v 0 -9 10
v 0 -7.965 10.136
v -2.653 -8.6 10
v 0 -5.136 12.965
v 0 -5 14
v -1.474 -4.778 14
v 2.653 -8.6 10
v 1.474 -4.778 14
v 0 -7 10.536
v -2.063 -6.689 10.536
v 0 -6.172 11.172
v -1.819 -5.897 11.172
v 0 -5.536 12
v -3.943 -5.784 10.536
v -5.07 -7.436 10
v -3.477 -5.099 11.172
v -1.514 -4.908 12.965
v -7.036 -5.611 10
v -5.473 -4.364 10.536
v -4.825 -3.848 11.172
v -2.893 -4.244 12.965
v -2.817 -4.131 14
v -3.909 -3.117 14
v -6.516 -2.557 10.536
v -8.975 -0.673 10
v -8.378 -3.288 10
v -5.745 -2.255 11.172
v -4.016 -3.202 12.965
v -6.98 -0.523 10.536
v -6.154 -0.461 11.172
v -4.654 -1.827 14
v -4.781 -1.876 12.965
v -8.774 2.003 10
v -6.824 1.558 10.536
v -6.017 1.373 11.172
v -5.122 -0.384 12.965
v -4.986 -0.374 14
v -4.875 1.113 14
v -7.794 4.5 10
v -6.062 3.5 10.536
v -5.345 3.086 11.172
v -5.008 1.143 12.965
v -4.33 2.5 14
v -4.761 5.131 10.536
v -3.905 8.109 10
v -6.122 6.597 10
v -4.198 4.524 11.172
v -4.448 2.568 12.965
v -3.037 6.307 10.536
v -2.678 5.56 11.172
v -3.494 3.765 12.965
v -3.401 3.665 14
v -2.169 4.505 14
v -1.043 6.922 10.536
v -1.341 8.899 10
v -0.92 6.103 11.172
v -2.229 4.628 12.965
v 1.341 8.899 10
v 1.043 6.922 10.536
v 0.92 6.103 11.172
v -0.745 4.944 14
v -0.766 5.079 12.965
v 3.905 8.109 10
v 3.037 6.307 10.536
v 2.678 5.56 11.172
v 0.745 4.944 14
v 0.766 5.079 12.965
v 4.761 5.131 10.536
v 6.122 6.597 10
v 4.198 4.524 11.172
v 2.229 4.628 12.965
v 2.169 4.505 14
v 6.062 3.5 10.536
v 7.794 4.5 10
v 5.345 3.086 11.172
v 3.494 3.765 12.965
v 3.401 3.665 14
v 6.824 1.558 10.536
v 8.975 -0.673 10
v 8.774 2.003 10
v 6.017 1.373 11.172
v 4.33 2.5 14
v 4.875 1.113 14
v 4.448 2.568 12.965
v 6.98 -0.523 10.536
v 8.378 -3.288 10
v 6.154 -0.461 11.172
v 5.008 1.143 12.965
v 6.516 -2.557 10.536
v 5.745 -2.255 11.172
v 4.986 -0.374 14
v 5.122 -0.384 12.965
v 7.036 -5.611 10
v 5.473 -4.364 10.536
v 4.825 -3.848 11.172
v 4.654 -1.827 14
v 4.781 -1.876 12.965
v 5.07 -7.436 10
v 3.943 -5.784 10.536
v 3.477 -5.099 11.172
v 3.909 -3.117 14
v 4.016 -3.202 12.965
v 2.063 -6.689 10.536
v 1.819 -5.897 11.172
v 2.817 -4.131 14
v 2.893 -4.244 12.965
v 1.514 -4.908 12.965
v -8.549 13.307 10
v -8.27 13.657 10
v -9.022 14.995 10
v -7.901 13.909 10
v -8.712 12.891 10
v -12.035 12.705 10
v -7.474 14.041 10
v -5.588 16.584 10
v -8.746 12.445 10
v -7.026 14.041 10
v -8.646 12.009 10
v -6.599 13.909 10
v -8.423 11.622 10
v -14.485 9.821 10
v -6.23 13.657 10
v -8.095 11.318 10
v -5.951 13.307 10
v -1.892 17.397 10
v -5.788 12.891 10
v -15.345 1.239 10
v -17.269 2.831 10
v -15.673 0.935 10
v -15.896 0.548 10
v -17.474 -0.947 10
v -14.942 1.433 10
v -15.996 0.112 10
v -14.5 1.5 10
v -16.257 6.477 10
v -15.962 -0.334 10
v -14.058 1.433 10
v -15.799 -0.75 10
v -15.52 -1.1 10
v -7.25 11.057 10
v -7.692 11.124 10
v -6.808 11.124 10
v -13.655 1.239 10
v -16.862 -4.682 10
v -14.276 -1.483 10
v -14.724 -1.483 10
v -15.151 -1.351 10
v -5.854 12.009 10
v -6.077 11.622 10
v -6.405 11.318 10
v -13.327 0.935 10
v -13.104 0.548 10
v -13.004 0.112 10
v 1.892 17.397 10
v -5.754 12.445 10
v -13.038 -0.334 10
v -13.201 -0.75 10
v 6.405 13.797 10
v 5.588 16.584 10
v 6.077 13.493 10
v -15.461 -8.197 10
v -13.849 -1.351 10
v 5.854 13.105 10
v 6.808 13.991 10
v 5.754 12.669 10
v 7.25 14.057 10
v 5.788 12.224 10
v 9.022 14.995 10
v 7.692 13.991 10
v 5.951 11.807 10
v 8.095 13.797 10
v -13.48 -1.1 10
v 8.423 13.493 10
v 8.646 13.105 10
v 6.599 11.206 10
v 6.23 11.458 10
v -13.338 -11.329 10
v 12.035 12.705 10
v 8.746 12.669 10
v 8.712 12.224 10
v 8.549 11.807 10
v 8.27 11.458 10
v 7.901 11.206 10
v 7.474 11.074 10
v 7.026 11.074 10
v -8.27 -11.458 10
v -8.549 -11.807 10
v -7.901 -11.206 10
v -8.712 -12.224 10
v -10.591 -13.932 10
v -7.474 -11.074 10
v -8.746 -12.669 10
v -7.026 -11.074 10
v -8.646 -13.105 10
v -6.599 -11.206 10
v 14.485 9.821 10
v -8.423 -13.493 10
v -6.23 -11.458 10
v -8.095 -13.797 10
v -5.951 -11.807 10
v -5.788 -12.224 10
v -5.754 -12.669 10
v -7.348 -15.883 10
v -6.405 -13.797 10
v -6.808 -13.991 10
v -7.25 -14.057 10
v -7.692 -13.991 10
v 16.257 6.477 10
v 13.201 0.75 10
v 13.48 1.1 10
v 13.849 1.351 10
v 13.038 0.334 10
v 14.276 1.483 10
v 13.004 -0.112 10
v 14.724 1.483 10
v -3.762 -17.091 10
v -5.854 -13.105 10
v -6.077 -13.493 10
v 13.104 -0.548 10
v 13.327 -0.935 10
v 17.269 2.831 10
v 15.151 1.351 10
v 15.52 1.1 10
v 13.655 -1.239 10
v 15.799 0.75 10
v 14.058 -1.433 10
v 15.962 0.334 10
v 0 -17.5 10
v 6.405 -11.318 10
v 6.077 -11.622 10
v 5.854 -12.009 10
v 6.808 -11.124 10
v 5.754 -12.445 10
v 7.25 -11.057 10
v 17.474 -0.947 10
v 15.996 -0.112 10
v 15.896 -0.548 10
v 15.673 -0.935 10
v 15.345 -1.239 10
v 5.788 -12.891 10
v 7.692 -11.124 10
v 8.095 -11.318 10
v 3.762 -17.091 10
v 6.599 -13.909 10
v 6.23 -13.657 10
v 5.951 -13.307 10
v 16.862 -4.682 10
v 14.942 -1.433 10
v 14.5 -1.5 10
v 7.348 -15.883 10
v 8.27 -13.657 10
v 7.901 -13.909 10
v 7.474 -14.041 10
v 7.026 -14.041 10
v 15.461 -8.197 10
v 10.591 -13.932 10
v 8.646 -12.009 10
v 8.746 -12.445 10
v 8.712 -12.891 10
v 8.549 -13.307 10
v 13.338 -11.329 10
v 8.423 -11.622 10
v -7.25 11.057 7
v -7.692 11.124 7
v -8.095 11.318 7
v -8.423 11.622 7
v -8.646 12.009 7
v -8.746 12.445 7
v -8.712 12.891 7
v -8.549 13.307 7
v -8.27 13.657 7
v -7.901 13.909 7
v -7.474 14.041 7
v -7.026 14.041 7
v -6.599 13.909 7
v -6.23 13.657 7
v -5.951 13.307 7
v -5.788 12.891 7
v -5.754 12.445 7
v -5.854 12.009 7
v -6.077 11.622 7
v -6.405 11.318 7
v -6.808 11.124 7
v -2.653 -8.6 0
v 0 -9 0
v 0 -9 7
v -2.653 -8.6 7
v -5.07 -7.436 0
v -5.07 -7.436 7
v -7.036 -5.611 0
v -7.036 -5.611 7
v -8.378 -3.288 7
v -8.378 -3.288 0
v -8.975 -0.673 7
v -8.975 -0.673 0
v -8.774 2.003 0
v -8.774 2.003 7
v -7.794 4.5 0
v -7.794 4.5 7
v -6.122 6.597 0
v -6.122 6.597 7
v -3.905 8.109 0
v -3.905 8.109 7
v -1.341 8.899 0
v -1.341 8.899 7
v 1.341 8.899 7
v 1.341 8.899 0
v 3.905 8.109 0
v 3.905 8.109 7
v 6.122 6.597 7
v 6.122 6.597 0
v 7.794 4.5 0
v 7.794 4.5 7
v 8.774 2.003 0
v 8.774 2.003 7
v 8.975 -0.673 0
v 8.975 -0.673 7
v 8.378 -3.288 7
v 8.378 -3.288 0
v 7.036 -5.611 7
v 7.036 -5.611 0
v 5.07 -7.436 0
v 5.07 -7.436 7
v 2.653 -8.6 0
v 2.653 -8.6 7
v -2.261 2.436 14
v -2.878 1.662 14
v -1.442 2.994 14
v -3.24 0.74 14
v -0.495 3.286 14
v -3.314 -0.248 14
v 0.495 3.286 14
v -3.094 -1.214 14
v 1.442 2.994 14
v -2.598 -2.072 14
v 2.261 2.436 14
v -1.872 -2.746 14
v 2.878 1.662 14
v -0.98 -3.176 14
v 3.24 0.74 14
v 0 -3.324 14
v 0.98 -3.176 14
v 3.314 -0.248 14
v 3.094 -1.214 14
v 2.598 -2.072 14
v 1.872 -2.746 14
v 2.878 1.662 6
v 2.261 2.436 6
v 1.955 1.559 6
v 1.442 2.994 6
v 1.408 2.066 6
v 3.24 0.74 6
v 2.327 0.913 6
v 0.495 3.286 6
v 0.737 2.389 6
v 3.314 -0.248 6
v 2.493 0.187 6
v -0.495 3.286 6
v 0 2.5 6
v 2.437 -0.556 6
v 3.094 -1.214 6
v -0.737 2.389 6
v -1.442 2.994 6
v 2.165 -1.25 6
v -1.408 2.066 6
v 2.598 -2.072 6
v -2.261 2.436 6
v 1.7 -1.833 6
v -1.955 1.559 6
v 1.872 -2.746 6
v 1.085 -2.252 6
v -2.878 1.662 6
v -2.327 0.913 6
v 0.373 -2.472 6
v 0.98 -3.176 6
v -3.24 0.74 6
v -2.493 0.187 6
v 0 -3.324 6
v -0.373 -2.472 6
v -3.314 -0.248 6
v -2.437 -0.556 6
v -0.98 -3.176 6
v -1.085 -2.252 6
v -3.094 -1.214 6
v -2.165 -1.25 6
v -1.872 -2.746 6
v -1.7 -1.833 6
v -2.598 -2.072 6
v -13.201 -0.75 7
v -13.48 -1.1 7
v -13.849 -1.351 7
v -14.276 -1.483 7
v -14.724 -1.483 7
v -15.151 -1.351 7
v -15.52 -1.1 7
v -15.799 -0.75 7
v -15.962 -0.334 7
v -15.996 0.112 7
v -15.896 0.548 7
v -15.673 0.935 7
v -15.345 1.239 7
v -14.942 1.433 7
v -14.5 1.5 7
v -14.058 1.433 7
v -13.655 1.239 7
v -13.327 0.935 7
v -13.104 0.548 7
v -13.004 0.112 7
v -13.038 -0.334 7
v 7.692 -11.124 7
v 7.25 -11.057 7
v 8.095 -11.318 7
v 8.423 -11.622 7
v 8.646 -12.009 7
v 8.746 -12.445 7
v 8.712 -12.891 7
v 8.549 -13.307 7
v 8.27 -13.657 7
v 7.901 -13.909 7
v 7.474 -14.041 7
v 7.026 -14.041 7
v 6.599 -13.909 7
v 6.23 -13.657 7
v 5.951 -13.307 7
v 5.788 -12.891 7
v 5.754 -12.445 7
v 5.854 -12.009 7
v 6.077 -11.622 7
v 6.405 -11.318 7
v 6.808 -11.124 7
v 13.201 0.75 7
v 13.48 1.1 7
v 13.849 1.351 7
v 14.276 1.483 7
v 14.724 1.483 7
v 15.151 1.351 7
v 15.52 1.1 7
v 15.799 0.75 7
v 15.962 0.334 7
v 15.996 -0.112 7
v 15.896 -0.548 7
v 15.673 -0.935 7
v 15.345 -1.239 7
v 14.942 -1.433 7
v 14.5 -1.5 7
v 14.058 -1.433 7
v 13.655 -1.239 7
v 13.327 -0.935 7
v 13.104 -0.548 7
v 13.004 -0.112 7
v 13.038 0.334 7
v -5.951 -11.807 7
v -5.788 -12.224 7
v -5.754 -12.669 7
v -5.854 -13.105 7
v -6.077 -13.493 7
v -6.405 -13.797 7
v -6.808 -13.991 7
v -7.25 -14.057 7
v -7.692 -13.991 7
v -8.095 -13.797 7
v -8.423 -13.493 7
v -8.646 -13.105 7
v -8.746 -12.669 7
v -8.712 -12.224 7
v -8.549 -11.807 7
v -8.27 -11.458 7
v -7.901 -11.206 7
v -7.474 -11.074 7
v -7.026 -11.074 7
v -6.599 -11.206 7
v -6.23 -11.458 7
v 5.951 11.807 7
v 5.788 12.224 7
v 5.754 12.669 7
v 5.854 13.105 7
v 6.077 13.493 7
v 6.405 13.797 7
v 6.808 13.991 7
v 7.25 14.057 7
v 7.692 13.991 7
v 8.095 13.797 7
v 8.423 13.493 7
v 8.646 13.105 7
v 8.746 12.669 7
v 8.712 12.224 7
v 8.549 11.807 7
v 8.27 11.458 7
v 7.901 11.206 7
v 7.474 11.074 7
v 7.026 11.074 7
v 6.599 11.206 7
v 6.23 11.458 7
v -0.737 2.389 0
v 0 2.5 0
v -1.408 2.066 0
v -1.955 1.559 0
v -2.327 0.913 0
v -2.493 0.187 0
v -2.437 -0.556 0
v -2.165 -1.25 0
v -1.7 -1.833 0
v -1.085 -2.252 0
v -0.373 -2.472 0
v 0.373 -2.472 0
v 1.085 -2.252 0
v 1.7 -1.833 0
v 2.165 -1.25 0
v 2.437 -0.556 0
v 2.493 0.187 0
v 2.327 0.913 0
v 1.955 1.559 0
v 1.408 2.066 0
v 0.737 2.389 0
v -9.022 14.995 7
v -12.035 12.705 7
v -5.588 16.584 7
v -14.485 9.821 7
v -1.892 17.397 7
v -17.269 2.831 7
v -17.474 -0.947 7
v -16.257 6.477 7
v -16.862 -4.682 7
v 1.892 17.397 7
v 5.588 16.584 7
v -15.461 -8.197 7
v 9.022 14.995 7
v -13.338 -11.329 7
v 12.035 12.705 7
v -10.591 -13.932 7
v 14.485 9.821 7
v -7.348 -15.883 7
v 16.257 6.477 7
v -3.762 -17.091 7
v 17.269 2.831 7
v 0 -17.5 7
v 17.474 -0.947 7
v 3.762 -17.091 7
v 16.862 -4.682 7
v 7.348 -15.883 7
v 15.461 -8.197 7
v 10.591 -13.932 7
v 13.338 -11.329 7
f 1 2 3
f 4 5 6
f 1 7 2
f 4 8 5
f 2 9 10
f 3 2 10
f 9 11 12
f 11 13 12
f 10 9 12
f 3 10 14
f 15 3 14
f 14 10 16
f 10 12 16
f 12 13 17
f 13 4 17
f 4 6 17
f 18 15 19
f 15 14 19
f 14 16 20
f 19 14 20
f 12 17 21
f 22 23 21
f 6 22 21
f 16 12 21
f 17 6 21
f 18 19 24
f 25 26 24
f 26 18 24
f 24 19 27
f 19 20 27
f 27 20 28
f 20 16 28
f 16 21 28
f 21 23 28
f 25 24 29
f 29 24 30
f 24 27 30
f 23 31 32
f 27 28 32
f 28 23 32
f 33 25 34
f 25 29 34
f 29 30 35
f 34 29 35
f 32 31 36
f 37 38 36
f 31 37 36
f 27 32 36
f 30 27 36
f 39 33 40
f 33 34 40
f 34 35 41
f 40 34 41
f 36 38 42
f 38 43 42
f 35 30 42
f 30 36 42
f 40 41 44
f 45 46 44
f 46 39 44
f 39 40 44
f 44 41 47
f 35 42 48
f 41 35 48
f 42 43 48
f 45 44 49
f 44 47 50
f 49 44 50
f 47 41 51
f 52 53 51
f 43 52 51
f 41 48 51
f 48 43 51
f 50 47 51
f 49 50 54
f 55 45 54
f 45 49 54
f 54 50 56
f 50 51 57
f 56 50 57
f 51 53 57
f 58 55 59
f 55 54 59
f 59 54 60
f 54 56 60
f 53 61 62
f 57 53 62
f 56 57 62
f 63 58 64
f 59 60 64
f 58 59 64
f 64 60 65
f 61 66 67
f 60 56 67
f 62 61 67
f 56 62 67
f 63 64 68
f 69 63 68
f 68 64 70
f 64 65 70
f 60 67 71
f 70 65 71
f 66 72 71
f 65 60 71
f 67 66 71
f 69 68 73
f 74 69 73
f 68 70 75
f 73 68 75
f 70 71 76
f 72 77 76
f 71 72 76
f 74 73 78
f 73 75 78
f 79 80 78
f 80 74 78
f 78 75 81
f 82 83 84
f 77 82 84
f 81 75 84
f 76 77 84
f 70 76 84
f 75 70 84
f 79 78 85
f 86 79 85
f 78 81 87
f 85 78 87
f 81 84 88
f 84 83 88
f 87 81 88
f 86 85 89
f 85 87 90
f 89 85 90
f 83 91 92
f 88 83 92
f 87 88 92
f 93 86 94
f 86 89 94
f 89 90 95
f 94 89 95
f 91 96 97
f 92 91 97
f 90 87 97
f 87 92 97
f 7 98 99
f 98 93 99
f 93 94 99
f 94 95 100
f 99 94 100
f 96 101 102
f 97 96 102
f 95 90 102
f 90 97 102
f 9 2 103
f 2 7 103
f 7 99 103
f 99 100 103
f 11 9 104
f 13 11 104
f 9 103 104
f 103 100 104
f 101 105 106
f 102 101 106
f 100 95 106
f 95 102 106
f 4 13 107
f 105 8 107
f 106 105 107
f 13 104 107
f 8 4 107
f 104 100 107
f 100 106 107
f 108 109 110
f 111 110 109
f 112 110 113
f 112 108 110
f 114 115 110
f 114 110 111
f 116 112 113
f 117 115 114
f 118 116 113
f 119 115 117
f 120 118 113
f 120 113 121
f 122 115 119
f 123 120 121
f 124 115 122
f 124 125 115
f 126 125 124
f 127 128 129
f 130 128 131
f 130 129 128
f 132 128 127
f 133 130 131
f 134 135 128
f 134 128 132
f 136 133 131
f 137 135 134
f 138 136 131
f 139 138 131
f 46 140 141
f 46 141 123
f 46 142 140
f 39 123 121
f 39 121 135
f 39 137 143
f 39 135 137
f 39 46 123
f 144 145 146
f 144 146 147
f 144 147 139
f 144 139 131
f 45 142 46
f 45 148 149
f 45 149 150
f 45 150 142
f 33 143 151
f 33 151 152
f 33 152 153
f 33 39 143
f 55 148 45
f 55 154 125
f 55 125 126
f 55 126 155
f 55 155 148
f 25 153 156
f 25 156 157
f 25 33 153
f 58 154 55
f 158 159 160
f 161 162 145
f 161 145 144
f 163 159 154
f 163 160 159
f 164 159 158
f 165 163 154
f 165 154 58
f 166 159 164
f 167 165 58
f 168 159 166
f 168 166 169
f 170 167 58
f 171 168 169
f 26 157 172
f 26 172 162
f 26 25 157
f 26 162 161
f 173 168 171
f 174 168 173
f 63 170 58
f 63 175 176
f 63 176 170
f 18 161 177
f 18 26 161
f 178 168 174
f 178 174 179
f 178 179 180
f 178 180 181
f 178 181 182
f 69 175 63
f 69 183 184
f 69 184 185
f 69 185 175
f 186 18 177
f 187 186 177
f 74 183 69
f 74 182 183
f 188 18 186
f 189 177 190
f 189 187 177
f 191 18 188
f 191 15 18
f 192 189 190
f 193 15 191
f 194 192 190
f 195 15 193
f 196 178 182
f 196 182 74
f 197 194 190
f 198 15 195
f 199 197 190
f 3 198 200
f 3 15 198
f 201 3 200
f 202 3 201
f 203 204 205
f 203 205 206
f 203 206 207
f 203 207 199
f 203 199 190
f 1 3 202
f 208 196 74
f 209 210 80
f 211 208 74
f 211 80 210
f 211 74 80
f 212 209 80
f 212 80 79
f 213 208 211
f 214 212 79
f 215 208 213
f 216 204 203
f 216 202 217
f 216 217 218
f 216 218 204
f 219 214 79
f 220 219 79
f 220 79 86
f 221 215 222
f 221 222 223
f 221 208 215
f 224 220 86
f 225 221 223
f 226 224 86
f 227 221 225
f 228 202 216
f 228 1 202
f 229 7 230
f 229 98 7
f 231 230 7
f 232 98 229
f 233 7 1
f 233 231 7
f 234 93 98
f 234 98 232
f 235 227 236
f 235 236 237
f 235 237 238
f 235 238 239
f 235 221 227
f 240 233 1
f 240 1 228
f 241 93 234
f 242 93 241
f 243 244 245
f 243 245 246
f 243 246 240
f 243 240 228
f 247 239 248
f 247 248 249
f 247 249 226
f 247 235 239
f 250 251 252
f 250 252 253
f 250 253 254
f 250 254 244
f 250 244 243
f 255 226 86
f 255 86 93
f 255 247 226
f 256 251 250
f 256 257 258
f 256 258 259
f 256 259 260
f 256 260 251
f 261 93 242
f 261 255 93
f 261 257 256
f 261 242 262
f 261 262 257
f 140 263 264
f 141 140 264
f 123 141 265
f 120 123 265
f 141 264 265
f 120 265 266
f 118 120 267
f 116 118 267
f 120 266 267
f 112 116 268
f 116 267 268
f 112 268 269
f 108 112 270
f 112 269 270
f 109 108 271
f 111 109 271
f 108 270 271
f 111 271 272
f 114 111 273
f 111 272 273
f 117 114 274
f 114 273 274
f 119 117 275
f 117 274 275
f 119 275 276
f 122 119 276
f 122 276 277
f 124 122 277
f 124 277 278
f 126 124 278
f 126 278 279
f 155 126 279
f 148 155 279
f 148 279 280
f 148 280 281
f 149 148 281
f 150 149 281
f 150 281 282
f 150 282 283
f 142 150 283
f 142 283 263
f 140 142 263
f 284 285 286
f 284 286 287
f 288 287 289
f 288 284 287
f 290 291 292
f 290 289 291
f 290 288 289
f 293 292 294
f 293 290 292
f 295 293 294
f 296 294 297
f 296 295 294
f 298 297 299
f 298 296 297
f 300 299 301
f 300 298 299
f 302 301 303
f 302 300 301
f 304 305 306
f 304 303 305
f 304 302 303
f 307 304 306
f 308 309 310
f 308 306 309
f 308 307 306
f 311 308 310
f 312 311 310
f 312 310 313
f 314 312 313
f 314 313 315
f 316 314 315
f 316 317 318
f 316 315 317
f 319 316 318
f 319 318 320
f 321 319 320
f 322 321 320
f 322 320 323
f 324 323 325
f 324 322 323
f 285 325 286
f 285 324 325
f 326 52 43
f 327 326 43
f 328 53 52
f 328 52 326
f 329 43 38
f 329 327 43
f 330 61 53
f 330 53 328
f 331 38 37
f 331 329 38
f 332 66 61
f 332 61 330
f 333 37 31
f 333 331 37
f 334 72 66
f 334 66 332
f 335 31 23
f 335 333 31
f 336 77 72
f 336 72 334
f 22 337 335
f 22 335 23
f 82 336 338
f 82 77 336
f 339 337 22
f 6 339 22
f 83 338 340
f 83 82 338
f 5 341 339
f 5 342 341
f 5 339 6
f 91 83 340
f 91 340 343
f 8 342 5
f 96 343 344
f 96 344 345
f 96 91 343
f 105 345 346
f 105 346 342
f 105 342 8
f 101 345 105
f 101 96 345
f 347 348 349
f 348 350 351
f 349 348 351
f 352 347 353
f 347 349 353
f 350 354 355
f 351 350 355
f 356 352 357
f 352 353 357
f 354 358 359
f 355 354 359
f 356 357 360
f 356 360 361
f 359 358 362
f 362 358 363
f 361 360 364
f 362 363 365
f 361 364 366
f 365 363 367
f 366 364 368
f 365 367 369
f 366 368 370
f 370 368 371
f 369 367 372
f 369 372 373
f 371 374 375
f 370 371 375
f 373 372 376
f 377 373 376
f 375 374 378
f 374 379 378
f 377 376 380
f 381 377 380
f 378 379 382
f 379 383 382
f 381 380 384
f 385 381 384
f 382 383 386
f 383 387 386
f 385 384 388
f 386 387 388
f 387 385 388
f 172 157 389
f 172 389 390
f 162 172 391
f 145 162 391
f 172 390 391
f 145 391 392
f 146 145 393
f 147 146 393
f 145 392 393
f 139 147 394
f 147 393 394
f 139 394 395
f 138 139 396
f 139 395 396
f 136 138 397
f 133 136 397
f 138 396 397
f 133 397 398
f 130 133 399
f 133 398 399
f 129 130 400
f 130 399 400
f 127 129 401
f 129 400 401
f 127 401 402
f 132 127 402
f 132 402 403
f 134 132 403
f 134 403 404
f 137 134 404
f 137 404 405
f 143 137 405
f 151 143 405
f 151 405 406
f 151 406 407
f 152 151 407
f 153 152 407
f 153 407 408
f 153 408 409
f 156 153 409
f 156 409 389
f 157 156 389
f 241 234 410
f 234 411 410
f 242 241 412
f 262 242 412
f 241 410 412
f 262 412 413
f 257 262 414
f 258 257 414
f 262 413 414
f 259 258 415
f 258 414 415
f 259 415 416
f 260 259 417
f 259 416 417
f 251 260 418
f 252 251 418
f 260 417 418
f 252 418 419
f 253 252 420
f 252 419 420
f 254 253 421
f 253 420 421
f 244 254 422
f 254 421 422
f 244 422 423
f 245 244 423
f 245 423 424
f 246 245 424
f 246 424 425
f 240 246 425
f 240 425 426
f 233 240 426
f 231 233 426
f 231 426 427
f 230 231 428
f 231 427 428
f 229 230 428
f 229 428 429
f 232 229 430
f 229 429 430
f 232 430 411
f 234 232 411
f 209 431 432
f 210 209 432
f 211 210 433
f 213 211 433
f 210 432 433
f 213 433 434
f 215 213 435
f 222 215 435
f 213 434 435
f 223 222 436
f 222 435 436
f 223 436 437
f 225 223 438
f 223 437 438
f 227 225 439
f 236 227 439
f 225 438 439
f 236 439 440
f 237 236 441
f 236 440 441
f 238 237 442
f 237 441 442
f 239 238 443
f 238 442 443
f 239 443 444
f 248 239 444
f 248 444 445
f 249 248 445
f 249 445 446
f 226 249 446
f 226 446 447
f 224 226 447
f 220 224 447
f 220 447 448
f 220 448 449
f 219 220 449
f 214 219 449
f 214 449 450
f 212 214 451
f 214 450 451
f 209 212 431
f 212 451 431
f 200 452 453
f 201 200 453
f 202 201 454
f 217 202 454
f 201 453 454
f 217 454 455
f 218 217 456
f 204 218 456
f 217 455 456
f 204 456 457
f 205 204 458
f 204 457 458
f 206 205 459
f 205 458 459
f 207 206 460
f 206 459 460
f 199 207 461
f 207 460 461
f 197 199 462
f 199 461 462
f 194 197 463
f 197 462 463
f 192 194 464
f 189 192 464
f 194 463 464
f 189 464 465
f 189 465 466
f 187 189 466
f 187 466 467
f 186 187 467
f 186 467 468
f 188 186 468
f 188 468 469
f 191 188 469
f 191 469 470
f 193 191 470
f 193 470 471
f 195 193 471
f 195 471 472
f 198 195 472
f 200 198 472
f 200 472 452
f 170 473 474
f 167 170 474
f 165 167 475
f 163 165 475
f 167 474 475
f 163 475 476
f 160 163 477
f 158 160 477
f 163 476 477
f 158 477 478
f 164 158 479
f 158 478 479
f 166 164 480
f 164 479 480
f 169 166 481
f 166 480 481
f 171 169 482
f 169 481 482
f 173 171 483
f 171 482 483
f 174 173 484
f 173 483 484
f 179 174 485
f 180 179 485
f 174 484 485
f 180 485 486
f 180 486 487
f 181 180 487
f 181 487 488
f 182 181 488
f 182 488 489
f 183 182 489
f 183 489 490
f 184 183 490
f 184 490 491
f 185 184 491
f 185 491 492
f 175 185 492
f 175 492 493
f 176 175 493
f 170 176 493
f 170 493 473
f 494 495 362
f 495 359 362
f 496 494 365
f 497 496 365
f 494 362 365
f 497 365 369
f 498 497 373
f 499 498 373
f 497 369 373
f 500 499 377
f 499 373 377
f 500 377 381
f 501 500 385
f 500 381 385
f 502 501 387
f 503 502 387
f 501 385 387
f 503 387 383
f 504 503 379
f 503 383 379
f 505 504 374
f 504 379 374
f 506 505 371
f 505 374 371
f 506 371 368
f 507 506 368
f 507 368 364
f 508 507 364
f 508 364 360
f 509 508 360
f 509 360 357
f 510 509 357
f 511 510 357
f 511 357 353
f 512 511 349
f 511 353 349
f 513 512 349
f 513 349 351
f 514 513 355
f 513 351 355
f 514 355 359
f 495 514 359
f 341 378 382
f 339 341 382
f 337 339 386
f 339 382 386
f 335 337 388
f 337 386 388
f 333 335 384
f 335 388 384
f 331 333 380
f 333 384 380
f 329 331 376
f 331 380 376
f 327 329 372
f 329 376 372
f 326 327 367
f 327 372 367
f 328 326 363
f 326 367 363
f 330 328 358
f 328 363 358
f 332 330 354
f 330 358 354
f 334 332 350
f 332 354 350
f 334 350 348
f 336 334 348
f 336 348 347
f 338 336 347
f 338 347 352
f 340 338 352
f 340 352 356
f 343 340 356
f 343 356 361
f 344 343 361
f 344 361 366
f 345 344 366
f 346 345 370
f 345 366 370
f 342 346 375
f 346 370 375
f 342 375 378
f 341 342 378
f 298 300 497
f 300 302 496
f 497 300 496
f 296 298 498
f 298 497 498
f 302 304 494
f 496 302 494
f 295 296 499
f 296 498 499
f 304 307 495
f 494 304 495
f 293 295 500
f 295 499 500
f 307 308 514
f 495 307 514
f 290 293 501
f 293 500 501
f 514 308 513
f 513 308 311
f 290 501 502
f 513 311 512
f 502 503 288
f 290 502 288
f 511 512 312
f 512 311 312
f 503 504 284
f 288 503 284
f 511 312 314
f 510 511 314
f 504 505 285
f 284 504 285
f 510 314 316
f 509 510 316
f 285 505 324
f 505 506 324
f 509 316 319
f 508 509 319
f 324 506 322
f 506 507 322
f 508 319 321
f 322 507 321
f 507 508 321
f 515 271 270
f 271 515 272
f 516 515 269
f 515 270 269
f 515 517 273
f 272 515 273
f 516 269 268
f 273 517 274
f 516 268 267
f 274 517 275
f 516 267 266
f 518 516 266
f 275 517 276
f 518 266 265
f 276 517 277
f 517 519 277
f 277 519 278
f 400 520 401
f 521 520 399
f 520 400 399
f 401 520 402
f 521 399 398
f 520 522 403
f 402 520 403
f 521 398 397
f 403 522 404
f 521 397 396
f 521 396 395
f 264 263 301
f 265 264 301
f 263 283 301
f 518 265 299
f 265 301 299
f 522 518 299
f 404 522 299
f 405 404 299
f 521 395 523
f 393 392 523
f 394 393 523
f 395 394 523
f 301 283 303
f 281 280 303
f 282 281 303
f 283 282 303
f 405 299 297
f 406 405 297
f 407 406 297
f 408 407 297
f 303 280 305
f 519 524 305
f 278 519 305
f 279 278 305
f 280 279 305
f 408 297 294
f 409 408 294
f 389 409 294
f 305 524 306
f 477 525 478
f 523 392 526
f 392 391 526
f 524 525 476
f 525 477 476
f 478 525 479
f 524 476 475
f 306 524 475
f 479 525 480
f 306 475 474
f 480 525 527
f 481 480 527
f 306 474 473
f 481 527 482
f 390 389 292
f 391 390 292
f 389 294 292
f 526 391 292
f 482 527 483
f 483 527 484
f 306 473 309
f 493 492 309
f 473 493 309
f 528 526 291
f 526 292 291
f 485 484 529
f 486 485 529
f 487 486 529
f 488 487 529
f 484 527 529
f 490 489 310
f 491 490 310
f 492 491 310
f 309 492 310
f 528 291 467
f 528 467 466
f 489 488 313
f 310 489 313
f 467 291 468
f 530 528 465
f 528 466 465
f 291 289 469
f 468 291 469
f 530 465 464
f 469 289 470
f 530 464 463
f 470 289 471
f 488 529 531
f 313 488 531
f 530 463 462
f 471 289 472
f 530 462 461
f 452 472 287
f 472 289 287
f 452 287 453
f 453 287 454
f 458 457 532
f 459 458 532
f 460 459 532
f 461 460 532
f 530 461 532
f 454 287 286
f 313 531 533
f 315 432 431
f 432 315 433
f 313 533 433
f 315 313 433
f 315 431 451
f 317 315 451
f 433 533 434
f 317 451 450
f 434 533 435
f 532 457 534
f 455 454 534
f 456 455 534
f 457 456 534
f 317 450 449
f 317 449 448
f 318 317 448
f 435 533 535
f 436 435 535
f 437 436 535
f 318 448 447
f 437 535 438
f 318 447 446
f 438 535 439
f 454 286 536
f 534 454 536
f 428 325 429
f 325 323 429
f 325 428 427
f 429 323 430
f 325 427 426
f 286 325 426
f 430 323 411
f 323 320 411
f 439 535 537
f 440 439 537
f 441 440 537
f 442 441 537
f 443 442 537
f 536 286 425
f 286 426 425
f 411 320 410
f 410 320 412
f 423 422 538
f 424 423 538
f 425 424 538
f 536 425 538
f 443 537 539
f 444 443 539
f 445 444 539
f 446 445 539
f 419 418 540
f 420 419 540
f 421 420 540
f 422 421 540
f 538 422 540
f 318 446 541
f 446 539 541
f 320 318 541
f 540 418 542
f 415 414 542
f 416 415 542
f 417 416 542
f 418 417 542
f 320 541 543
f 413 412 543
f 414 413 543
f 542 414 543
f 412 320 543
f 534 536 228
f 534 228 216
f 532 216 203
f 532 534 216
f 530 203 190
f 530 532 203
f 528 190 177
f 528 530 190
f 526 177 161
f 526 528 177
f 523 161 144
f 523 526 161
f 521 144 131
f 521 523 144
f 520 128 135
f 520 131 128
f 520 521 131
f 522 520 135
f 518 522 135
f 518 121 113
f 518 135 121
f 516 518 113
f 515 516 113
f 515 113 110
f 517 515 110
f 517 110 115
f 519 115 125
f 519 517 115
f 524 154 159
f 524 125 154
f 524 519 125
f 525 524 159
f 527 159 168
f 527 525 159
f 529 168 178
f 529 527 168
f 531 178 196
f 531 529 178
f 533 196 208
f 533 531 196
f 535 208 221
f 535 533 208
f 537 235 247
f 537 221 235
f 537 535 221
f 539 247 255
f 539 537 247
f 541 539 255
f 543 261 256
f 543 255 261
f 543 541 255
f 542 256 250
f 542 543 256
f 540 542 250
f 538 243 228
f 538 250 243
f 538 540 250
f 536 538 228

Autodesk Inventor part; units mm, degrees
ref_plane "XZ Plane" through (0, 0, 0) normal (0, 1, 0) x (-1, 0, 0)
ref_plane "XY Plane" through (0, 0, 0) normal (0, 0, 1) x (1, 0, 0)
ref_plane "Work Plane1" through (0, 0, 0) normal (1, 0, 0) x (0, 1, 0)
sketch "Sketch3" plane through (0, 0, 0) normal (1, 0, 0) x (0, 1, 0)
  line L0 (0, 0) -> (0, 14)
  line L1 (0, 14) -> (-5, 14)
  arc A0 (-9, 10) -> (-5, 14) centre (-9, 14) ccw
  line L2 (-9, 10) -> (-17.5, 10)
  line L3 (-17.5, 10) -> (-17.5, 7)
  line L4 (-17.5, 7) -> (-9, 7)
  line L5 (-9, 7) -> (-9, 0)
  line L6 (-9, 0) -> (0, 0)
  dimension "d10" = 4
  dimension "d11" = 3
  dimension "d12" = 35
  dimension "d13" = 7
  dimension "d14" = 18
revolve "Revolution2" add sketch "Sketch3" angle 360 about axis through (0, 0, 0) along (0, 0, 1)
sketch "Sketch4" plane through (0, 0, 14) normal (0, 0, 1) x (1, 0, 0)
  circle A0 centre (0, 0) radius 5 projected
  point P0 (0, 0)
hole "Hole1" at (0, 0, 14) direction (0, 0, -1) diameter 6.647 depth 8 thread size "M8x1.25" class "6H" standard "ISO Metric profile"
sketch "Sketch5" plane through (0, 0, 0) normal (0, 0, -1) x (-1, 0, 0)
  circle A0 centre (0, 0) radius 9 projected
  point P0 (0, 0)
hole "Hole2" at (0, 0, 0) direction (0, 0, 1) diameter 5 depth 6
sketch "Sketch6" plane through (0, 0, 10) normal (0, 0, 1) x (1, 0, 0)
  line L0 (0, 0) -> (0, 20.3424) construction
  circle A0 centre (0, 0) radius 2.5 projected
  line L1 (0, 0) -> (-11.8721, 20.5631) construction
  circle A1 centre (0, 0) radius 5 projected
  circle A2 centre (0, 0) radius 14.5 construction
  point P0 (-7.25, 12.5574)
  dimension "d31" = 29
  dimension "d30" = 30
hole "Hole3" at (-7.25, 12.5574, 10) direction (0, 0, -1) diameter 3 depth 3
pattern_circular "Circular Pattern1" count 6 over 360 about axis through (0, 0, 8.5) along (0, 0, 1) of "Hole3"
properties part number "156" material "Gold"
